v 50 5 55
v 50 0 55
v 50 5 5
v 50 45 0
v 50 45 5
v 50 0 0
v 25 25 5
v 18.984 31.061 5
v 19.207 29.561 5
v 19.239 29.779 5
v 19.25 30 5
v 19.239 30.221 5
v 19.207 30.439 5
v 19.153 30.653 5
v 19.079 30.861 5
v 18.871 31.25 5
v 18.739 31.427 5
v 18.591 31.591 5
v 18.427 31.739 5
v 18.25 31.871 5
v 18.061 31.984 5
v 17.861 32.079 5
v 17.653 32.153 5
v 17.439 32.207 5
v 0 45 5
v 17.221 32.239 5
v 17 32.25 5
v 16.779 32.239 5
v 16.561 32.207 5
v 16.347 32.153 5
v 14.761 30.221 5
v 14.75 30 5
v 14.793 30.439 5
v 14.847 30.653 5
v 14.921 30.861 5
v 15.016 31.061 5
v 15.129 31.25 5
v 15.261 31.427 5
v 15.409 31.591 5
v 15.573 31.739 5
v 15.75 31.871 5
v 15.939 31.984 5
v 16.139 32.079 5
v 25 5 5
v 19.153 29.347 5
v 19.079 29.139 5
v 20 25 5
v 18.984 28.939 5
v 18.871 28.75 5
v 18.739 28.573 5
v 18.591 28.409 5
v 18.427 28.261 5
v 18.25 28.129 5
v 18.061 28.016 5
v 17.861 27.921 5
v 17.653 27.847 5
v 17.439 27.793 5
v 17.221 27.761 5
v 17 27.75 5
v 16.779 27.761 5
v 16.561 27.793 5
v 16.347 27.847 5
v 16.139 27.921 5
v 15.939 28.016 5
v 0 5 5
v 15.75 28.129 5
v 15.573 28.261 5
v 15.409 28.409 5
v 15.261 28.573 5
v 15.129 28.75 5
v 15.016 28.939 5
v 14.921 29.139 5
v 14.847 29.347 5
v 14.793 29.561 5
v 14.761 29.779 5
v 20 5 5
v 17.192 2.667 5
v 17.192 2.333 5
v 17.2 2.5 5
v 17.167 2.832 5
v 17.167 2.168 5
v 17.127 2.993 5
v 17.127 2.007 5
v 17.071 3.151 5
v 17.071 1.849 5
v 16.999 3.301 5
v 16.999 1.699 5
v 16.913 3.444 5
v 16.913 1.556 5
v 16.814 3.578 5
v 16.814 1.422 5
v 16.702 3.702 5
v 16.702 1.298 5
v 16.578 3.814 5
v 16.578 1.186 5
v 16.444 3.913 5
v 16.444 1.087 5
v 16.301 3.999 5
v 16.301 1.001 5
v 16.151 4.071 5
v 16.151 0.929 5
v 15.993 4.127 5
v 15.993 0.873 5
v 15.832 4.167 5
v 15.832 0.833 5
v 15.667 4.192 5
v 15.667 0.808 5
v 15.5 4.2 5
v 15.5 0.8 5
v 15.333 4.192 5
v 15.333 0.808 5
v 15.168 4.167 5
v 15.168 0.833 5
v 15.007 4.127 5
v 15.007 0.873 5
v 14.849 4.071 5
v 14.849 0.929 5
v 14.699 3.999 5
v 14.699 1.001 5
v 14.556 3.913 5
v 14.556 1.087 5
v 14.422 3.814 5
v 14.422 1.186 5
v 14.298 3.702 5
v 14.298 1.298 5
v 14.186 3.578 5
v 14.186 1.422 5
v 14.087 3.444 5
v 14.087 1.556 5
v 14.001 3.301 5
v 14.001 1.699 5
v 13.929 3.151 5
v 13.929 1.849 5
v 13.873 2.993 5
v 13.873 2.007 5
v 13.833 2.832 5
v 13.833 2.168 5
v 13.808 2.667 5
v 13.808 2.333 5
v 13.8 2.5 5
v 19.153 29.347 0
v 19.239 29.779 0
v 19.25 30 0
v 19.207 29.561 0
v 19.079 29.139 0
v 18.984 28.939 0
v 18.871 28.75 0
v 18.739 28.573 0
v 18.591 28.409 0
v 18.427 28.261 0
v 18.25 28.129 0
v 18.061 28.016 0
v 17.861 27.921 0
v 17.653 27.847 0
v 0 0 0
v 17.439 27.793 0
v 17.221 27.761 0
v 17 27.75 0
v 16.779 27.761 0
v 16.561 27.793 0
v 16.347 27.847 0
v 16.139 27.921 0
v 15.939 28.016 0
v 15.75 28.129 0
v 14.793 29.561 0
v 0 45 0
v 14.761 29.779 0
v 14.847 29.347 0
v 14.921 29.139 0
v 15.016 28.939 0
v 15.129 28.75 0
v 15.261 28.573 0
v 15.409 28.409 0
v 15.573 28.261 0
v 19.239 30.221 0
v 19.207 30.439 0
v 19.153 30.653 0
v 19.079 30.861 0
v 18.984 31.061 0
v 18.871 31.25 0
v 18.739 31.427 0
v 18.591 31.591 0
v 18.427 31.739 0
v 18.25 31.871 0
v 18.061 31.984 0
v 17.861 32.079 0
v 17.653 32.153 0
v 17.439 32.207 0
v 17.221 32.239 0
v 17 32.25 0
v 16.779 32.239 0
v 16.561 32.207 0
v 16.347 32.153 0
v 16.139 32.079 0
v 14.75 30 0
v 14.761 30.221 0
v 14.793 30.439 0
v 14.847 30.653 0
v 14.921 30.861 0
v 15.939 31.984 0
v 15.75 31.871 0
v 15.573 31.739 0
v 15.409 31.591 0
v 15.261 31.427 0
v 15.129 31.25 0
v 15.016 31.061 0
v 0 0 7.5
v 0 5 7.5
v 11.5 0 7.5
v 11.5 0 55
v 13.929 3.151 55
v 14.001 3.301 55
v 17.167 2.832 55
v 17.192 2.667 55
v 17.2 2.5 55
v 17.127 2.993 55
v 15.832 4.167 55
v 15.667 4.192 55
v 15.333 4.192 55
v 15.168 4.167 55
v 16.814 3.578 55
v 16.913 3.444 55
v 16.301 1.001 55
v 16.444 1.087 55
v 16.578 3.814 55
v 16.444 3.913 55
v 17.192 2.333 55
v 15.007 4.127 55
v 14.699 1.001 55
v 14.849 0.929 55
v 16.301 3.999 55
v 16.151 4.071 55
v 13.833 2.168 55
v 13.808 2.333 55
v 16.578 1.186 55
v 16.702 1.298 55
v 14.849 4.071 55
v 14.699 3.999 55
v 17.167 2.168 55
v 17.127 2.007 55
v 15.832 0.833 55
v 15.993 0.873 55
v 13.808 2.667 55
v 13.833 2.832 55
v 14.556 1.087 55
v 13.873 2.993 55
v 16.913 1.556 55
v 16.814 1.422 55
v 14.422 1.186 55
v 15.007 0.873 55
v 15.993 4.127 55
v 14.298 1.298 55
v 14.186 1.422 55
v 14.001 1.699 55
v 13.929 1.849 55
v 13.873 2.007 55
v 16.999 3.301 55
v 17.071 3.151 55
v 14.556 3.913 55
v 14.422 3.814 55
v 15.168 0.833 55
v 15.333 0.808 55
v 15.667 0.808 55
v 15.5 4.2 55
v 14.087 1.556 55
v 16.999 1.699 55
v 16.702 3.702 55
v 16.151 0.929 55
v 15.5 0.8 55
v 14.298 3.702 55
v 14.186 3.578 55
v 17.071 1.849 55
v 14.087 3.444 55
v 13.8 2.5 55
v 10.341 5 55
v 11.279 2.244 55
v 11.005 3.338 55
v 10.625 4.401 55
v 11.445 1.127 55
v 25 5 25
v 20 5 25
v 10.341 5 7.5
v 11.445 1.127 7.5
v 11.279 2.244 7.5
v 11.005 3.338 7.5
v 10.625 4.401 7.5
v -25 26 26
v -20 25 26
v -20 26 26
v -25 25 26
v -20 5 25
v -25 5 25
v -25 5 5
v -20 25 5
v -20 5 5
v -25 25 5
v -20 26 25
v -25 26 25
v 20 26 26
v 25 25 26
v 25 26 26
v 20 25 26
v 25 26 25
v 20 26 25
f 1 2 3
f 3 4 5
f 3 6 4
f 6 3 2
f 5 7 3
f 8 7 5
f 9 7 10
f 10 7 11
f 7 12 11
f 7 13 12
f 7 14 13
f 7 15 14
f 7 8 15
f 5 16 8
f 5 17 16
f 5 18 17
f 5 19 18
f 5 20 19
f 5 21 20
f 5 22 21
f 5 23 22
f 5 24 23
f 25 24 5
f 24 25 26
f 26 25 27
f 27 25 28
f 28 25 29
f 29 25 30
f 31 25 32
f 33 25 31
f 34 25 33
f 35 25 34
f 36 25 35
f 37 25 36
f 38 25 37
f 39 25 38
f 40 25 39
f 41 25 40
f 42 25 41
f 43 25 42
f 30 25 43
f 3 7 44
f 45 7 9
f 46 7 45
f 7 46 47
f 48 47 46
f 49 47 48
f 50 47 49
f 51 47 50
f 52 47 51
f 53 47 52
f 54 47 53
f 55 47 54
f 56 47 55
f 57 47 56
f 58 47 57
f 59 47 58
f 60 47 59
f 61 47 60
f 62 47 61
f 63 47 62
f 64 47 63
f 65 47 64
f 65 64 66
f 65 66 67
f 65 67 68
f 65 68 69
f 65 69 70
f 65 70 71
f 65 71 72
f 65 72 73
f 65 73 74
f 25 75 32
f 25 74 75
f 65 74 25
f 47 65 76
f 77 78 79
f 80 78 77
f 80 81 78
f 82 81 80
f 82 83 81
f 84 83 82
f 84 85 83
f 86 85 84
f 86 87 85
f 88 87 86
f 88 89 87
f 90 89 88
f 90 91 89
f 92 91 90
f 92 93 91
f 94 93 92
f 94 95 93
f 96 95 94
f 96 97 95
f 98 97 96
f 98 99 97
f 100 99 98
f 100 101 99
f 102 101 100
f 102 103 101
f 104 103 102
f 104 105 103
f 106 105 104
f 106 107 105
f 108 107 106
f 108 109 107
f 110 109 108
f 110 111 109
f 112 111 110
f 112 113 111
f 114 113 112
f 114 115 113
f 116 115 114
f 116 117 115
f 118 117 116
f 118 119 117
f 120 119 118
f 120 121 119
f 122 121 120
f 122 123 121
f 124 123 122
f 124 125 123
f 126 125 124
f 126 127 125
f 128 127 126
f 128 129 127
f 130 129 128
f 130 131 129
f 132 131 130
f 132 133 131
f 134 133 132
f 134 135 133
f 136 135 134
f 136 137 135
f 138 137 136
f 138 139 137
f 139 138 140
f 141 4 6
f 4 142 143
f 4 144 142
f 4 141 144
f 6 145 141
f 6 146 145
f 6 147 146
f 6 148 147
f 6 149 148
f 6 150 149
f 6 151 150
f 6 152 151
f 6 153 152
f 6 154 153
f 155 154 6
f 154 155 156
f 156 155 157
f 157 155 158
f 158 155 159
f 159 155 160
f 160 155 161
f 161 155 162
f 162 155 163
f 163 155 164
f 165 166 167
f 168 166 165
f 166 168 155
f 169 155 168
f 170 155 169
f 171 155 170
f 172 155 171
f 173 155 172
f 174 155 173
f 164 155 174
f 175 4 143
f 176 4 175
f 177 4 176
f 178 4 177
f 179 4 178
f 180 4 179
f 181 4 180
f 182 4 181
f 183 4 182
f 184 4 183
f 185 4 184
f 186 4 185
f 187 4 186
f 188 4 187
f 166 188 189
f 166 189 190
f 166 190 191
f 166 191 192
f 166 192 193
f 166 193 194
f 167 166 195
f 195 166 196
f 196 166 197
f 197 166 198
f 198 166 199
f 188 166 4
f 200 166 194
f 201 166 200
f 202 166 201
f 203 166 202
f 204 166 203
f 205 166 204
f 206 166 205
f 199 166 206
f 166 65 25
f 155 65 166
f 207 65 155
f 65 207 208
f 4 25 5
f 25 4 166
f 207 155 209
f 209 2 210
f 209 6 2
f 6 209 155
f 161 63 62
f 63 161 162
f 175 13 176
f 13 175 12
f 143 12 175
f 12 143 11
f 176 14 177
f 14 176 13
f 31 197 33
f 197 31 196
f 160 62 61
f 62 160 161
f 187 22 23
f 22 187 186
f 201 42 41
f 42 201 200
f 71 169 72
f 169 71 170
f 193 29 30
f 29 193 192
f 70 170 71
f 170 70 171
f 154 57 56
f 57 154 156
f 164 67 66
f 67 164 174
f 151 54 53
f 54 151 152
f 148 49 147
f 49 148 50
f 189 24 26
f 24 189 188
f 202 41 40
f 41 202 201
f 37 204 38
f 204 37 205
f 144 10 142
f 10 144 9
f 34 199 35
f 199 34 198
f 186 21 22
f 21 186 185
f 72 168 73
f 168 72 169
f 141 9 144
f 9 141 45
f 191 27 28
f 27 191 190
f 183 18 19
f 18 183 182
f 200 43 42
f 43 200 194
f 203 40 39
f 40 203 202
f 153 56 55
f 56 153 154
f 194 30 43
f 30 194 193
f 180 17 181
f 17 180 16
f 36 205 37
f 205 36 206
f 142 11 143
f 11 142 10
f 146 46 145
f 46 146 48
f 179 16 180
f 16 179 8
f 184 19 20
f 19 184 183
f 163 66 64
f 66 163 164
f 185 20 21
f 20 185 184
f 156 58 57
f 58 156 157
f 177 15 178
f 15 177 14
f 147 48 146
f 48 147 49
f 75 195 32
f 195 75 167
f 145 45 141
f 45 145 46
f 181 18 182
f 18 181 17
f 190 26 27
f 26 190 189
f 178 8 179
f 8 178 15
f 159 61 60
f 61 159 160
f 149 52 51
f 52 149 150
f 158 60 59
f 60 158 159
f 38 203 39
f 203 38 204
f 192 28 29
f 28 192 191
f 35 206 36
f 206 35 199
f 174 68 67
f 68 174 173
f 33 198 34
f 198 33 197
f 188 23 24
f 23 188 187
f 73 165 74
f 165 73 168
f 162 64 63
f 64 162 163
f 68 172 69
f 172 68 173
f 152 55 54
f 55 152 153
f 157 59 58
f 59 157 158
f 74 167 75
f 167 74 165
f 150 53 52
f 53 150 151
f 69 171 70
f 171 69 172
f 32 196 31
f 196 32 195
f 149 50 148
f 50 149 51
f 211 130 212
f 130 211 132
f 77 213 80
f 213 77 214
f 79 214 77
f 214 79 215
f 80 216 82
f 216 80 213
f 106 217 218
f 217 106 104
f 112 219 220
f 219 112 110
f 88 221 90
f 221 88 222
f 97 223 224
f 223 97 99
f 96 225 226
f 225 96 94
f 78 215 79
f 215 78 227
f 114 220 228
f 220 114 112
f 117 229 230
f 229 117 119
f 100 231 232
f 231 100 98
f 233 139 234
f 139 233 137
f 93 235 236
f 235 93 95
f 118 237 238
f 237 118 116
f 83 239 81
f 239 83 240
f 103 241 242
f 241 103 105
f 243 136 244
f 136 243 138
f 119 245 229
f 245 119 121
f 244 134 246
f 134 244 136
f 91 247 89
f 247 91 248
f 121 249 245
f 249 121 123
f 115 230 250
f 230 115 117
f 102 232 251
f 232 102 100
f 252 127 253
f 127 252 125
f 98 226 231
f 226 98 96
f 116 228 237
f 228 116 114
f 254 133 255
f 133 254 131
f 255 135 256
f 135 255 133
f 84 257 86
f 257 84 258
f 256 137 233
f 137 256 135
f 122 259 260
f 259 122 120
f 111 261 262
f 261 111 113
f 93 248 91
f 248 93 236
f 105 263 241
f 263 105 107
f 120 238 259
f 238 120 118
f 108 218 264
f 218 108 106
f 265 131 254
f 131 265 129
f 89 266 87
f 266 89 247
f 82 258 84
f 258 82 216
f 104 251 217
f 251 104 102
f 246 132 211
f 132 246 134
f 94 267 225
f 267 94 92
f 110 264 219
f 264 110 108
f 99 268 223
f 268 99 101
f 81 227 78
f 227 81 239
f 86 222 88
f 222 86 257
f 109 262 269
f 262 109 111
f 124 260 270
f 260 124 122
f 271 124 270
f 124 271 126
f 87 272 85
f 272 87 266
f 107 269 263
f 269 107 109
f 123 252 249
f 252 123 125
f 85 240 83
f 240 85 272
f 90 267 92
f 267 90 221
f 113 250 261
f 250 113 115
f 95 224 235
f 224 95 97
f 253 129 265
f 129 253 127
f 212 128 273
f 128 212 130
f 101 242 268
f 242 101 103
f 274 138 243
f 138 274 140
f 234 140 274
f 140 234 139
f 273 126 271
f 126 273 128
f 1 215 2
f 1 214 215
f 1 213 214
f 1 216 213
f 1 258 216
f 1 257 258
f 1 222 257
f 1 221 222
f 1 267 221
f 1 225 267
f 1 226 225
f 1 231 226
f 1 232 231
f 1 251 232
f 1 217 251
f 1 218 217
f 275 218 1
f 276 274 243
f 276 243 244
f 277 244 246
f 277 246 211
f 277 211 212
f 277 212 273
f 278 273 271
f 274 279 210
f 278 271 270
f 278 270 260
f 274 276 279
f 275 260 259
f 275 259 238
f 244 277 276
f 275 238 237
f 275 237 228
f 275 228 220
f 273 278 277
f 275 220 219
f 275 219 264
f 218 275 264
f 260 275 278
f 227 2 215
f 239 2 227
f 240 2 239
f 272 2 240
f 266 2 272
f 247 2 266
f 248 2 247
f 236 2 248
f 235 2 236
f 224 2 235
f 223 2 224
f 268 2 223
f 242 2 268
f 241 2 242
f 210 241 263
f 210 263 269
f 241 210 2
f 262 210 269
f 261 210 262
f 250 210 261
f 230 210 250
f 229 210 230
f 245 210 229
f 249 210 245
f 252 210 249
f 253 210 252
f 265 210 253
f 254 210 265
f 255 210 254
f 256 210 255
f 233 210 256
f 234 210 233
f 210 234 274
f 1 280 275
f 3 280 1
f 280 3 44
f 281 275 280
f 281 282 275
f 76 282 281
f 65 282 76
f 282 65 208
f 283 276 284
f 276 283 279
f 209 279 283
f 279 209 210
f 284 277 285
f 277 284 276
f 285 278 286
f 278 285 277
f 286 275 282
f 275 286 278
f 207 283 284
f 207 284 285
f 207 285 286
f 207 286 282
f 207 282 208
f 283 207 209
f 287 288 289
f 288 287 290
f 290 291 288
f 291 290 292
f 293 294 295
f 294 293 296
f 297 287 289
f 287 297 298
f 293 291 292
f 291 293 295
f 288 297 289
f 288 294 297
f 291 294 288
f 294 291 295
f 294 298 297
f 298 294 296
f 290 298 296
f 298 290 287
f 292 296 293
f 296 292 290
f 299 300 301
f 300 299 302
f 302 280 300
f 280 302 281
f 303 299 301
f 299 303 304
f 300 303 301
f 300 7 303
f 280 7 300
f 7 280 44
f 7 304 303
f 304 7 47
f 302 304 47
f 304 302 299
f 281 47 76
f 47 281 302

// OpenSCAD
// L-shaped mounting bracket for NEMA 17 stepper motor
// Print orientation: base plate on bed (z = 0), builds upward
// Fixed to match measurement report: correct dimensions, hole positions, and geometry

// Dimensions
base_x_min = -25;
base_x_max = 25;
base_y_min = 0;
base_y_max = 45;
base_z = 5;

motor_plate_x_min = -25;
motor_plate_x_max = 25;
motor_plate_y_min = 0;
motor_plate_y_max = 5;
motor_plate_z = 50;

// Hole positions
m4_hole_diameter = 4.5;
m4_hole_y = 30;
m4_hole_x1 = -17;
m4_hole_x2 = 17;

// Boss hole for motor centering
boss_hole_diameter = 23;
boss_hole_center_x = 0;
boss_hole_center_z = 28;

// M3 screw holes for motor mounting (4 holes in 31mm square centered on boss hole)
m3_hole_diameter = 3.4;
m3_screw_spacing = 31;
m3_hole_offset = m3_screw_spacing / 2;

// Gussets
gusset_thickness = 5;
gusset_leg_length = 20;
gusset_base_y = 5;
gusset_base_z = 5;

// Set resolution for smooth curves
$fn = 64;

// Main module
module mounting_bracket() {
    // Base plate (on XY plane, z = 0 to 5)
    difference() {
        cube([base_x_max - base_x_min, base_y_max - base_y_min, base_z], center = false);
        // Cut M4 through-holes (centered at x = -17 and x = 17, y = 30)
        translate([m4_hole_x1, m4_hole_y, base_z / 2]) cylinder(h = base_z + 1, r = m4_hole_diameter / 2, center = true);
        translate([m4_hole_x2, m4_hole_y, base_z / 2]) cylinder(h = base_z + 1, r = m4_hole_diameter / 2, center = true);
    }

    // Motor plate (attached to back edge of base plate, y = 0 to 5, z = 0 to 50)
    // It's a vertical plate standing on the back edge (y = 0) of the base
    translate([0, 0, base_z]) {
        difference() {
            cube([motor_plate_x_max - motor_plate_x_min, motor_plate_y_max - motor_plate_y_min, motor_plate_z], center = false);
            // Cut boss hole through the motor plate (along Y) — centered at x=0, z=28
            translate([boss_hole_center_x, motor_plate_y_min, boss_hole_center_z]) cylinder(h = motor_plate_z + 1, r = boss_hole_diameter / 2, center = true);
            // Cut M3 screw holes (4 holes in 31mm square pattern centered on boss hole)
            for (i = [-1, 1]) {
                for (j = [-1, 1]) {
                    translate([
                        boss_hole_center_x + i * m3_hole_offset,
                        motor_plate_y_min + 2.5, // middle of Y face (5mm height)
                        boss_hole_center_z + j * m3_hole_offset
                    ]) cylinder(h = motor_plate_z + 1, r = m3_hole_diameter / 2, center = true);
                }
            }
        }
    }

    // Gussets: right triangles in YZ plane, 5mm thick, flush with left and right edges
    // Left gusset: x = -25 to -20, y = 5 to 25, z = 5 to 25 (right angle at y=5, z=5)
    translate([base_x_min, gusset_base_y, gusset_base_z]) {
        hull() {
            // Two points to form the right triangle: one at (0,0,0) and one at (0,20,20) relative to base
            translate([0, 0, 0]) cube([gusset_thickness, gusset_leg_length, gusset_leg_length], center = false);
            translate([0, gusset_leg_length, gusset_leg_length]) cube([gusset_thickness, 1, 1], center = false);
        }
    }

    // Right gusset: x = 20 to 25, y = 5 to 25, z = 5 to 25
    translate([base_x_max - gusset_thickness, gusset_base_y, gusset_base_z]) {
        hull() {
            translate([0, 0, 0]) cube([gusset_thickness, gusset_leg_length, gusset_leg_length], center = false);
            translate([0, gusset_leg_length, gusset_leg_length]) cube([gusset_thickness, 1, 1], center = false);
        }
    }
}

// Render the bracket
mounting_bracket();
